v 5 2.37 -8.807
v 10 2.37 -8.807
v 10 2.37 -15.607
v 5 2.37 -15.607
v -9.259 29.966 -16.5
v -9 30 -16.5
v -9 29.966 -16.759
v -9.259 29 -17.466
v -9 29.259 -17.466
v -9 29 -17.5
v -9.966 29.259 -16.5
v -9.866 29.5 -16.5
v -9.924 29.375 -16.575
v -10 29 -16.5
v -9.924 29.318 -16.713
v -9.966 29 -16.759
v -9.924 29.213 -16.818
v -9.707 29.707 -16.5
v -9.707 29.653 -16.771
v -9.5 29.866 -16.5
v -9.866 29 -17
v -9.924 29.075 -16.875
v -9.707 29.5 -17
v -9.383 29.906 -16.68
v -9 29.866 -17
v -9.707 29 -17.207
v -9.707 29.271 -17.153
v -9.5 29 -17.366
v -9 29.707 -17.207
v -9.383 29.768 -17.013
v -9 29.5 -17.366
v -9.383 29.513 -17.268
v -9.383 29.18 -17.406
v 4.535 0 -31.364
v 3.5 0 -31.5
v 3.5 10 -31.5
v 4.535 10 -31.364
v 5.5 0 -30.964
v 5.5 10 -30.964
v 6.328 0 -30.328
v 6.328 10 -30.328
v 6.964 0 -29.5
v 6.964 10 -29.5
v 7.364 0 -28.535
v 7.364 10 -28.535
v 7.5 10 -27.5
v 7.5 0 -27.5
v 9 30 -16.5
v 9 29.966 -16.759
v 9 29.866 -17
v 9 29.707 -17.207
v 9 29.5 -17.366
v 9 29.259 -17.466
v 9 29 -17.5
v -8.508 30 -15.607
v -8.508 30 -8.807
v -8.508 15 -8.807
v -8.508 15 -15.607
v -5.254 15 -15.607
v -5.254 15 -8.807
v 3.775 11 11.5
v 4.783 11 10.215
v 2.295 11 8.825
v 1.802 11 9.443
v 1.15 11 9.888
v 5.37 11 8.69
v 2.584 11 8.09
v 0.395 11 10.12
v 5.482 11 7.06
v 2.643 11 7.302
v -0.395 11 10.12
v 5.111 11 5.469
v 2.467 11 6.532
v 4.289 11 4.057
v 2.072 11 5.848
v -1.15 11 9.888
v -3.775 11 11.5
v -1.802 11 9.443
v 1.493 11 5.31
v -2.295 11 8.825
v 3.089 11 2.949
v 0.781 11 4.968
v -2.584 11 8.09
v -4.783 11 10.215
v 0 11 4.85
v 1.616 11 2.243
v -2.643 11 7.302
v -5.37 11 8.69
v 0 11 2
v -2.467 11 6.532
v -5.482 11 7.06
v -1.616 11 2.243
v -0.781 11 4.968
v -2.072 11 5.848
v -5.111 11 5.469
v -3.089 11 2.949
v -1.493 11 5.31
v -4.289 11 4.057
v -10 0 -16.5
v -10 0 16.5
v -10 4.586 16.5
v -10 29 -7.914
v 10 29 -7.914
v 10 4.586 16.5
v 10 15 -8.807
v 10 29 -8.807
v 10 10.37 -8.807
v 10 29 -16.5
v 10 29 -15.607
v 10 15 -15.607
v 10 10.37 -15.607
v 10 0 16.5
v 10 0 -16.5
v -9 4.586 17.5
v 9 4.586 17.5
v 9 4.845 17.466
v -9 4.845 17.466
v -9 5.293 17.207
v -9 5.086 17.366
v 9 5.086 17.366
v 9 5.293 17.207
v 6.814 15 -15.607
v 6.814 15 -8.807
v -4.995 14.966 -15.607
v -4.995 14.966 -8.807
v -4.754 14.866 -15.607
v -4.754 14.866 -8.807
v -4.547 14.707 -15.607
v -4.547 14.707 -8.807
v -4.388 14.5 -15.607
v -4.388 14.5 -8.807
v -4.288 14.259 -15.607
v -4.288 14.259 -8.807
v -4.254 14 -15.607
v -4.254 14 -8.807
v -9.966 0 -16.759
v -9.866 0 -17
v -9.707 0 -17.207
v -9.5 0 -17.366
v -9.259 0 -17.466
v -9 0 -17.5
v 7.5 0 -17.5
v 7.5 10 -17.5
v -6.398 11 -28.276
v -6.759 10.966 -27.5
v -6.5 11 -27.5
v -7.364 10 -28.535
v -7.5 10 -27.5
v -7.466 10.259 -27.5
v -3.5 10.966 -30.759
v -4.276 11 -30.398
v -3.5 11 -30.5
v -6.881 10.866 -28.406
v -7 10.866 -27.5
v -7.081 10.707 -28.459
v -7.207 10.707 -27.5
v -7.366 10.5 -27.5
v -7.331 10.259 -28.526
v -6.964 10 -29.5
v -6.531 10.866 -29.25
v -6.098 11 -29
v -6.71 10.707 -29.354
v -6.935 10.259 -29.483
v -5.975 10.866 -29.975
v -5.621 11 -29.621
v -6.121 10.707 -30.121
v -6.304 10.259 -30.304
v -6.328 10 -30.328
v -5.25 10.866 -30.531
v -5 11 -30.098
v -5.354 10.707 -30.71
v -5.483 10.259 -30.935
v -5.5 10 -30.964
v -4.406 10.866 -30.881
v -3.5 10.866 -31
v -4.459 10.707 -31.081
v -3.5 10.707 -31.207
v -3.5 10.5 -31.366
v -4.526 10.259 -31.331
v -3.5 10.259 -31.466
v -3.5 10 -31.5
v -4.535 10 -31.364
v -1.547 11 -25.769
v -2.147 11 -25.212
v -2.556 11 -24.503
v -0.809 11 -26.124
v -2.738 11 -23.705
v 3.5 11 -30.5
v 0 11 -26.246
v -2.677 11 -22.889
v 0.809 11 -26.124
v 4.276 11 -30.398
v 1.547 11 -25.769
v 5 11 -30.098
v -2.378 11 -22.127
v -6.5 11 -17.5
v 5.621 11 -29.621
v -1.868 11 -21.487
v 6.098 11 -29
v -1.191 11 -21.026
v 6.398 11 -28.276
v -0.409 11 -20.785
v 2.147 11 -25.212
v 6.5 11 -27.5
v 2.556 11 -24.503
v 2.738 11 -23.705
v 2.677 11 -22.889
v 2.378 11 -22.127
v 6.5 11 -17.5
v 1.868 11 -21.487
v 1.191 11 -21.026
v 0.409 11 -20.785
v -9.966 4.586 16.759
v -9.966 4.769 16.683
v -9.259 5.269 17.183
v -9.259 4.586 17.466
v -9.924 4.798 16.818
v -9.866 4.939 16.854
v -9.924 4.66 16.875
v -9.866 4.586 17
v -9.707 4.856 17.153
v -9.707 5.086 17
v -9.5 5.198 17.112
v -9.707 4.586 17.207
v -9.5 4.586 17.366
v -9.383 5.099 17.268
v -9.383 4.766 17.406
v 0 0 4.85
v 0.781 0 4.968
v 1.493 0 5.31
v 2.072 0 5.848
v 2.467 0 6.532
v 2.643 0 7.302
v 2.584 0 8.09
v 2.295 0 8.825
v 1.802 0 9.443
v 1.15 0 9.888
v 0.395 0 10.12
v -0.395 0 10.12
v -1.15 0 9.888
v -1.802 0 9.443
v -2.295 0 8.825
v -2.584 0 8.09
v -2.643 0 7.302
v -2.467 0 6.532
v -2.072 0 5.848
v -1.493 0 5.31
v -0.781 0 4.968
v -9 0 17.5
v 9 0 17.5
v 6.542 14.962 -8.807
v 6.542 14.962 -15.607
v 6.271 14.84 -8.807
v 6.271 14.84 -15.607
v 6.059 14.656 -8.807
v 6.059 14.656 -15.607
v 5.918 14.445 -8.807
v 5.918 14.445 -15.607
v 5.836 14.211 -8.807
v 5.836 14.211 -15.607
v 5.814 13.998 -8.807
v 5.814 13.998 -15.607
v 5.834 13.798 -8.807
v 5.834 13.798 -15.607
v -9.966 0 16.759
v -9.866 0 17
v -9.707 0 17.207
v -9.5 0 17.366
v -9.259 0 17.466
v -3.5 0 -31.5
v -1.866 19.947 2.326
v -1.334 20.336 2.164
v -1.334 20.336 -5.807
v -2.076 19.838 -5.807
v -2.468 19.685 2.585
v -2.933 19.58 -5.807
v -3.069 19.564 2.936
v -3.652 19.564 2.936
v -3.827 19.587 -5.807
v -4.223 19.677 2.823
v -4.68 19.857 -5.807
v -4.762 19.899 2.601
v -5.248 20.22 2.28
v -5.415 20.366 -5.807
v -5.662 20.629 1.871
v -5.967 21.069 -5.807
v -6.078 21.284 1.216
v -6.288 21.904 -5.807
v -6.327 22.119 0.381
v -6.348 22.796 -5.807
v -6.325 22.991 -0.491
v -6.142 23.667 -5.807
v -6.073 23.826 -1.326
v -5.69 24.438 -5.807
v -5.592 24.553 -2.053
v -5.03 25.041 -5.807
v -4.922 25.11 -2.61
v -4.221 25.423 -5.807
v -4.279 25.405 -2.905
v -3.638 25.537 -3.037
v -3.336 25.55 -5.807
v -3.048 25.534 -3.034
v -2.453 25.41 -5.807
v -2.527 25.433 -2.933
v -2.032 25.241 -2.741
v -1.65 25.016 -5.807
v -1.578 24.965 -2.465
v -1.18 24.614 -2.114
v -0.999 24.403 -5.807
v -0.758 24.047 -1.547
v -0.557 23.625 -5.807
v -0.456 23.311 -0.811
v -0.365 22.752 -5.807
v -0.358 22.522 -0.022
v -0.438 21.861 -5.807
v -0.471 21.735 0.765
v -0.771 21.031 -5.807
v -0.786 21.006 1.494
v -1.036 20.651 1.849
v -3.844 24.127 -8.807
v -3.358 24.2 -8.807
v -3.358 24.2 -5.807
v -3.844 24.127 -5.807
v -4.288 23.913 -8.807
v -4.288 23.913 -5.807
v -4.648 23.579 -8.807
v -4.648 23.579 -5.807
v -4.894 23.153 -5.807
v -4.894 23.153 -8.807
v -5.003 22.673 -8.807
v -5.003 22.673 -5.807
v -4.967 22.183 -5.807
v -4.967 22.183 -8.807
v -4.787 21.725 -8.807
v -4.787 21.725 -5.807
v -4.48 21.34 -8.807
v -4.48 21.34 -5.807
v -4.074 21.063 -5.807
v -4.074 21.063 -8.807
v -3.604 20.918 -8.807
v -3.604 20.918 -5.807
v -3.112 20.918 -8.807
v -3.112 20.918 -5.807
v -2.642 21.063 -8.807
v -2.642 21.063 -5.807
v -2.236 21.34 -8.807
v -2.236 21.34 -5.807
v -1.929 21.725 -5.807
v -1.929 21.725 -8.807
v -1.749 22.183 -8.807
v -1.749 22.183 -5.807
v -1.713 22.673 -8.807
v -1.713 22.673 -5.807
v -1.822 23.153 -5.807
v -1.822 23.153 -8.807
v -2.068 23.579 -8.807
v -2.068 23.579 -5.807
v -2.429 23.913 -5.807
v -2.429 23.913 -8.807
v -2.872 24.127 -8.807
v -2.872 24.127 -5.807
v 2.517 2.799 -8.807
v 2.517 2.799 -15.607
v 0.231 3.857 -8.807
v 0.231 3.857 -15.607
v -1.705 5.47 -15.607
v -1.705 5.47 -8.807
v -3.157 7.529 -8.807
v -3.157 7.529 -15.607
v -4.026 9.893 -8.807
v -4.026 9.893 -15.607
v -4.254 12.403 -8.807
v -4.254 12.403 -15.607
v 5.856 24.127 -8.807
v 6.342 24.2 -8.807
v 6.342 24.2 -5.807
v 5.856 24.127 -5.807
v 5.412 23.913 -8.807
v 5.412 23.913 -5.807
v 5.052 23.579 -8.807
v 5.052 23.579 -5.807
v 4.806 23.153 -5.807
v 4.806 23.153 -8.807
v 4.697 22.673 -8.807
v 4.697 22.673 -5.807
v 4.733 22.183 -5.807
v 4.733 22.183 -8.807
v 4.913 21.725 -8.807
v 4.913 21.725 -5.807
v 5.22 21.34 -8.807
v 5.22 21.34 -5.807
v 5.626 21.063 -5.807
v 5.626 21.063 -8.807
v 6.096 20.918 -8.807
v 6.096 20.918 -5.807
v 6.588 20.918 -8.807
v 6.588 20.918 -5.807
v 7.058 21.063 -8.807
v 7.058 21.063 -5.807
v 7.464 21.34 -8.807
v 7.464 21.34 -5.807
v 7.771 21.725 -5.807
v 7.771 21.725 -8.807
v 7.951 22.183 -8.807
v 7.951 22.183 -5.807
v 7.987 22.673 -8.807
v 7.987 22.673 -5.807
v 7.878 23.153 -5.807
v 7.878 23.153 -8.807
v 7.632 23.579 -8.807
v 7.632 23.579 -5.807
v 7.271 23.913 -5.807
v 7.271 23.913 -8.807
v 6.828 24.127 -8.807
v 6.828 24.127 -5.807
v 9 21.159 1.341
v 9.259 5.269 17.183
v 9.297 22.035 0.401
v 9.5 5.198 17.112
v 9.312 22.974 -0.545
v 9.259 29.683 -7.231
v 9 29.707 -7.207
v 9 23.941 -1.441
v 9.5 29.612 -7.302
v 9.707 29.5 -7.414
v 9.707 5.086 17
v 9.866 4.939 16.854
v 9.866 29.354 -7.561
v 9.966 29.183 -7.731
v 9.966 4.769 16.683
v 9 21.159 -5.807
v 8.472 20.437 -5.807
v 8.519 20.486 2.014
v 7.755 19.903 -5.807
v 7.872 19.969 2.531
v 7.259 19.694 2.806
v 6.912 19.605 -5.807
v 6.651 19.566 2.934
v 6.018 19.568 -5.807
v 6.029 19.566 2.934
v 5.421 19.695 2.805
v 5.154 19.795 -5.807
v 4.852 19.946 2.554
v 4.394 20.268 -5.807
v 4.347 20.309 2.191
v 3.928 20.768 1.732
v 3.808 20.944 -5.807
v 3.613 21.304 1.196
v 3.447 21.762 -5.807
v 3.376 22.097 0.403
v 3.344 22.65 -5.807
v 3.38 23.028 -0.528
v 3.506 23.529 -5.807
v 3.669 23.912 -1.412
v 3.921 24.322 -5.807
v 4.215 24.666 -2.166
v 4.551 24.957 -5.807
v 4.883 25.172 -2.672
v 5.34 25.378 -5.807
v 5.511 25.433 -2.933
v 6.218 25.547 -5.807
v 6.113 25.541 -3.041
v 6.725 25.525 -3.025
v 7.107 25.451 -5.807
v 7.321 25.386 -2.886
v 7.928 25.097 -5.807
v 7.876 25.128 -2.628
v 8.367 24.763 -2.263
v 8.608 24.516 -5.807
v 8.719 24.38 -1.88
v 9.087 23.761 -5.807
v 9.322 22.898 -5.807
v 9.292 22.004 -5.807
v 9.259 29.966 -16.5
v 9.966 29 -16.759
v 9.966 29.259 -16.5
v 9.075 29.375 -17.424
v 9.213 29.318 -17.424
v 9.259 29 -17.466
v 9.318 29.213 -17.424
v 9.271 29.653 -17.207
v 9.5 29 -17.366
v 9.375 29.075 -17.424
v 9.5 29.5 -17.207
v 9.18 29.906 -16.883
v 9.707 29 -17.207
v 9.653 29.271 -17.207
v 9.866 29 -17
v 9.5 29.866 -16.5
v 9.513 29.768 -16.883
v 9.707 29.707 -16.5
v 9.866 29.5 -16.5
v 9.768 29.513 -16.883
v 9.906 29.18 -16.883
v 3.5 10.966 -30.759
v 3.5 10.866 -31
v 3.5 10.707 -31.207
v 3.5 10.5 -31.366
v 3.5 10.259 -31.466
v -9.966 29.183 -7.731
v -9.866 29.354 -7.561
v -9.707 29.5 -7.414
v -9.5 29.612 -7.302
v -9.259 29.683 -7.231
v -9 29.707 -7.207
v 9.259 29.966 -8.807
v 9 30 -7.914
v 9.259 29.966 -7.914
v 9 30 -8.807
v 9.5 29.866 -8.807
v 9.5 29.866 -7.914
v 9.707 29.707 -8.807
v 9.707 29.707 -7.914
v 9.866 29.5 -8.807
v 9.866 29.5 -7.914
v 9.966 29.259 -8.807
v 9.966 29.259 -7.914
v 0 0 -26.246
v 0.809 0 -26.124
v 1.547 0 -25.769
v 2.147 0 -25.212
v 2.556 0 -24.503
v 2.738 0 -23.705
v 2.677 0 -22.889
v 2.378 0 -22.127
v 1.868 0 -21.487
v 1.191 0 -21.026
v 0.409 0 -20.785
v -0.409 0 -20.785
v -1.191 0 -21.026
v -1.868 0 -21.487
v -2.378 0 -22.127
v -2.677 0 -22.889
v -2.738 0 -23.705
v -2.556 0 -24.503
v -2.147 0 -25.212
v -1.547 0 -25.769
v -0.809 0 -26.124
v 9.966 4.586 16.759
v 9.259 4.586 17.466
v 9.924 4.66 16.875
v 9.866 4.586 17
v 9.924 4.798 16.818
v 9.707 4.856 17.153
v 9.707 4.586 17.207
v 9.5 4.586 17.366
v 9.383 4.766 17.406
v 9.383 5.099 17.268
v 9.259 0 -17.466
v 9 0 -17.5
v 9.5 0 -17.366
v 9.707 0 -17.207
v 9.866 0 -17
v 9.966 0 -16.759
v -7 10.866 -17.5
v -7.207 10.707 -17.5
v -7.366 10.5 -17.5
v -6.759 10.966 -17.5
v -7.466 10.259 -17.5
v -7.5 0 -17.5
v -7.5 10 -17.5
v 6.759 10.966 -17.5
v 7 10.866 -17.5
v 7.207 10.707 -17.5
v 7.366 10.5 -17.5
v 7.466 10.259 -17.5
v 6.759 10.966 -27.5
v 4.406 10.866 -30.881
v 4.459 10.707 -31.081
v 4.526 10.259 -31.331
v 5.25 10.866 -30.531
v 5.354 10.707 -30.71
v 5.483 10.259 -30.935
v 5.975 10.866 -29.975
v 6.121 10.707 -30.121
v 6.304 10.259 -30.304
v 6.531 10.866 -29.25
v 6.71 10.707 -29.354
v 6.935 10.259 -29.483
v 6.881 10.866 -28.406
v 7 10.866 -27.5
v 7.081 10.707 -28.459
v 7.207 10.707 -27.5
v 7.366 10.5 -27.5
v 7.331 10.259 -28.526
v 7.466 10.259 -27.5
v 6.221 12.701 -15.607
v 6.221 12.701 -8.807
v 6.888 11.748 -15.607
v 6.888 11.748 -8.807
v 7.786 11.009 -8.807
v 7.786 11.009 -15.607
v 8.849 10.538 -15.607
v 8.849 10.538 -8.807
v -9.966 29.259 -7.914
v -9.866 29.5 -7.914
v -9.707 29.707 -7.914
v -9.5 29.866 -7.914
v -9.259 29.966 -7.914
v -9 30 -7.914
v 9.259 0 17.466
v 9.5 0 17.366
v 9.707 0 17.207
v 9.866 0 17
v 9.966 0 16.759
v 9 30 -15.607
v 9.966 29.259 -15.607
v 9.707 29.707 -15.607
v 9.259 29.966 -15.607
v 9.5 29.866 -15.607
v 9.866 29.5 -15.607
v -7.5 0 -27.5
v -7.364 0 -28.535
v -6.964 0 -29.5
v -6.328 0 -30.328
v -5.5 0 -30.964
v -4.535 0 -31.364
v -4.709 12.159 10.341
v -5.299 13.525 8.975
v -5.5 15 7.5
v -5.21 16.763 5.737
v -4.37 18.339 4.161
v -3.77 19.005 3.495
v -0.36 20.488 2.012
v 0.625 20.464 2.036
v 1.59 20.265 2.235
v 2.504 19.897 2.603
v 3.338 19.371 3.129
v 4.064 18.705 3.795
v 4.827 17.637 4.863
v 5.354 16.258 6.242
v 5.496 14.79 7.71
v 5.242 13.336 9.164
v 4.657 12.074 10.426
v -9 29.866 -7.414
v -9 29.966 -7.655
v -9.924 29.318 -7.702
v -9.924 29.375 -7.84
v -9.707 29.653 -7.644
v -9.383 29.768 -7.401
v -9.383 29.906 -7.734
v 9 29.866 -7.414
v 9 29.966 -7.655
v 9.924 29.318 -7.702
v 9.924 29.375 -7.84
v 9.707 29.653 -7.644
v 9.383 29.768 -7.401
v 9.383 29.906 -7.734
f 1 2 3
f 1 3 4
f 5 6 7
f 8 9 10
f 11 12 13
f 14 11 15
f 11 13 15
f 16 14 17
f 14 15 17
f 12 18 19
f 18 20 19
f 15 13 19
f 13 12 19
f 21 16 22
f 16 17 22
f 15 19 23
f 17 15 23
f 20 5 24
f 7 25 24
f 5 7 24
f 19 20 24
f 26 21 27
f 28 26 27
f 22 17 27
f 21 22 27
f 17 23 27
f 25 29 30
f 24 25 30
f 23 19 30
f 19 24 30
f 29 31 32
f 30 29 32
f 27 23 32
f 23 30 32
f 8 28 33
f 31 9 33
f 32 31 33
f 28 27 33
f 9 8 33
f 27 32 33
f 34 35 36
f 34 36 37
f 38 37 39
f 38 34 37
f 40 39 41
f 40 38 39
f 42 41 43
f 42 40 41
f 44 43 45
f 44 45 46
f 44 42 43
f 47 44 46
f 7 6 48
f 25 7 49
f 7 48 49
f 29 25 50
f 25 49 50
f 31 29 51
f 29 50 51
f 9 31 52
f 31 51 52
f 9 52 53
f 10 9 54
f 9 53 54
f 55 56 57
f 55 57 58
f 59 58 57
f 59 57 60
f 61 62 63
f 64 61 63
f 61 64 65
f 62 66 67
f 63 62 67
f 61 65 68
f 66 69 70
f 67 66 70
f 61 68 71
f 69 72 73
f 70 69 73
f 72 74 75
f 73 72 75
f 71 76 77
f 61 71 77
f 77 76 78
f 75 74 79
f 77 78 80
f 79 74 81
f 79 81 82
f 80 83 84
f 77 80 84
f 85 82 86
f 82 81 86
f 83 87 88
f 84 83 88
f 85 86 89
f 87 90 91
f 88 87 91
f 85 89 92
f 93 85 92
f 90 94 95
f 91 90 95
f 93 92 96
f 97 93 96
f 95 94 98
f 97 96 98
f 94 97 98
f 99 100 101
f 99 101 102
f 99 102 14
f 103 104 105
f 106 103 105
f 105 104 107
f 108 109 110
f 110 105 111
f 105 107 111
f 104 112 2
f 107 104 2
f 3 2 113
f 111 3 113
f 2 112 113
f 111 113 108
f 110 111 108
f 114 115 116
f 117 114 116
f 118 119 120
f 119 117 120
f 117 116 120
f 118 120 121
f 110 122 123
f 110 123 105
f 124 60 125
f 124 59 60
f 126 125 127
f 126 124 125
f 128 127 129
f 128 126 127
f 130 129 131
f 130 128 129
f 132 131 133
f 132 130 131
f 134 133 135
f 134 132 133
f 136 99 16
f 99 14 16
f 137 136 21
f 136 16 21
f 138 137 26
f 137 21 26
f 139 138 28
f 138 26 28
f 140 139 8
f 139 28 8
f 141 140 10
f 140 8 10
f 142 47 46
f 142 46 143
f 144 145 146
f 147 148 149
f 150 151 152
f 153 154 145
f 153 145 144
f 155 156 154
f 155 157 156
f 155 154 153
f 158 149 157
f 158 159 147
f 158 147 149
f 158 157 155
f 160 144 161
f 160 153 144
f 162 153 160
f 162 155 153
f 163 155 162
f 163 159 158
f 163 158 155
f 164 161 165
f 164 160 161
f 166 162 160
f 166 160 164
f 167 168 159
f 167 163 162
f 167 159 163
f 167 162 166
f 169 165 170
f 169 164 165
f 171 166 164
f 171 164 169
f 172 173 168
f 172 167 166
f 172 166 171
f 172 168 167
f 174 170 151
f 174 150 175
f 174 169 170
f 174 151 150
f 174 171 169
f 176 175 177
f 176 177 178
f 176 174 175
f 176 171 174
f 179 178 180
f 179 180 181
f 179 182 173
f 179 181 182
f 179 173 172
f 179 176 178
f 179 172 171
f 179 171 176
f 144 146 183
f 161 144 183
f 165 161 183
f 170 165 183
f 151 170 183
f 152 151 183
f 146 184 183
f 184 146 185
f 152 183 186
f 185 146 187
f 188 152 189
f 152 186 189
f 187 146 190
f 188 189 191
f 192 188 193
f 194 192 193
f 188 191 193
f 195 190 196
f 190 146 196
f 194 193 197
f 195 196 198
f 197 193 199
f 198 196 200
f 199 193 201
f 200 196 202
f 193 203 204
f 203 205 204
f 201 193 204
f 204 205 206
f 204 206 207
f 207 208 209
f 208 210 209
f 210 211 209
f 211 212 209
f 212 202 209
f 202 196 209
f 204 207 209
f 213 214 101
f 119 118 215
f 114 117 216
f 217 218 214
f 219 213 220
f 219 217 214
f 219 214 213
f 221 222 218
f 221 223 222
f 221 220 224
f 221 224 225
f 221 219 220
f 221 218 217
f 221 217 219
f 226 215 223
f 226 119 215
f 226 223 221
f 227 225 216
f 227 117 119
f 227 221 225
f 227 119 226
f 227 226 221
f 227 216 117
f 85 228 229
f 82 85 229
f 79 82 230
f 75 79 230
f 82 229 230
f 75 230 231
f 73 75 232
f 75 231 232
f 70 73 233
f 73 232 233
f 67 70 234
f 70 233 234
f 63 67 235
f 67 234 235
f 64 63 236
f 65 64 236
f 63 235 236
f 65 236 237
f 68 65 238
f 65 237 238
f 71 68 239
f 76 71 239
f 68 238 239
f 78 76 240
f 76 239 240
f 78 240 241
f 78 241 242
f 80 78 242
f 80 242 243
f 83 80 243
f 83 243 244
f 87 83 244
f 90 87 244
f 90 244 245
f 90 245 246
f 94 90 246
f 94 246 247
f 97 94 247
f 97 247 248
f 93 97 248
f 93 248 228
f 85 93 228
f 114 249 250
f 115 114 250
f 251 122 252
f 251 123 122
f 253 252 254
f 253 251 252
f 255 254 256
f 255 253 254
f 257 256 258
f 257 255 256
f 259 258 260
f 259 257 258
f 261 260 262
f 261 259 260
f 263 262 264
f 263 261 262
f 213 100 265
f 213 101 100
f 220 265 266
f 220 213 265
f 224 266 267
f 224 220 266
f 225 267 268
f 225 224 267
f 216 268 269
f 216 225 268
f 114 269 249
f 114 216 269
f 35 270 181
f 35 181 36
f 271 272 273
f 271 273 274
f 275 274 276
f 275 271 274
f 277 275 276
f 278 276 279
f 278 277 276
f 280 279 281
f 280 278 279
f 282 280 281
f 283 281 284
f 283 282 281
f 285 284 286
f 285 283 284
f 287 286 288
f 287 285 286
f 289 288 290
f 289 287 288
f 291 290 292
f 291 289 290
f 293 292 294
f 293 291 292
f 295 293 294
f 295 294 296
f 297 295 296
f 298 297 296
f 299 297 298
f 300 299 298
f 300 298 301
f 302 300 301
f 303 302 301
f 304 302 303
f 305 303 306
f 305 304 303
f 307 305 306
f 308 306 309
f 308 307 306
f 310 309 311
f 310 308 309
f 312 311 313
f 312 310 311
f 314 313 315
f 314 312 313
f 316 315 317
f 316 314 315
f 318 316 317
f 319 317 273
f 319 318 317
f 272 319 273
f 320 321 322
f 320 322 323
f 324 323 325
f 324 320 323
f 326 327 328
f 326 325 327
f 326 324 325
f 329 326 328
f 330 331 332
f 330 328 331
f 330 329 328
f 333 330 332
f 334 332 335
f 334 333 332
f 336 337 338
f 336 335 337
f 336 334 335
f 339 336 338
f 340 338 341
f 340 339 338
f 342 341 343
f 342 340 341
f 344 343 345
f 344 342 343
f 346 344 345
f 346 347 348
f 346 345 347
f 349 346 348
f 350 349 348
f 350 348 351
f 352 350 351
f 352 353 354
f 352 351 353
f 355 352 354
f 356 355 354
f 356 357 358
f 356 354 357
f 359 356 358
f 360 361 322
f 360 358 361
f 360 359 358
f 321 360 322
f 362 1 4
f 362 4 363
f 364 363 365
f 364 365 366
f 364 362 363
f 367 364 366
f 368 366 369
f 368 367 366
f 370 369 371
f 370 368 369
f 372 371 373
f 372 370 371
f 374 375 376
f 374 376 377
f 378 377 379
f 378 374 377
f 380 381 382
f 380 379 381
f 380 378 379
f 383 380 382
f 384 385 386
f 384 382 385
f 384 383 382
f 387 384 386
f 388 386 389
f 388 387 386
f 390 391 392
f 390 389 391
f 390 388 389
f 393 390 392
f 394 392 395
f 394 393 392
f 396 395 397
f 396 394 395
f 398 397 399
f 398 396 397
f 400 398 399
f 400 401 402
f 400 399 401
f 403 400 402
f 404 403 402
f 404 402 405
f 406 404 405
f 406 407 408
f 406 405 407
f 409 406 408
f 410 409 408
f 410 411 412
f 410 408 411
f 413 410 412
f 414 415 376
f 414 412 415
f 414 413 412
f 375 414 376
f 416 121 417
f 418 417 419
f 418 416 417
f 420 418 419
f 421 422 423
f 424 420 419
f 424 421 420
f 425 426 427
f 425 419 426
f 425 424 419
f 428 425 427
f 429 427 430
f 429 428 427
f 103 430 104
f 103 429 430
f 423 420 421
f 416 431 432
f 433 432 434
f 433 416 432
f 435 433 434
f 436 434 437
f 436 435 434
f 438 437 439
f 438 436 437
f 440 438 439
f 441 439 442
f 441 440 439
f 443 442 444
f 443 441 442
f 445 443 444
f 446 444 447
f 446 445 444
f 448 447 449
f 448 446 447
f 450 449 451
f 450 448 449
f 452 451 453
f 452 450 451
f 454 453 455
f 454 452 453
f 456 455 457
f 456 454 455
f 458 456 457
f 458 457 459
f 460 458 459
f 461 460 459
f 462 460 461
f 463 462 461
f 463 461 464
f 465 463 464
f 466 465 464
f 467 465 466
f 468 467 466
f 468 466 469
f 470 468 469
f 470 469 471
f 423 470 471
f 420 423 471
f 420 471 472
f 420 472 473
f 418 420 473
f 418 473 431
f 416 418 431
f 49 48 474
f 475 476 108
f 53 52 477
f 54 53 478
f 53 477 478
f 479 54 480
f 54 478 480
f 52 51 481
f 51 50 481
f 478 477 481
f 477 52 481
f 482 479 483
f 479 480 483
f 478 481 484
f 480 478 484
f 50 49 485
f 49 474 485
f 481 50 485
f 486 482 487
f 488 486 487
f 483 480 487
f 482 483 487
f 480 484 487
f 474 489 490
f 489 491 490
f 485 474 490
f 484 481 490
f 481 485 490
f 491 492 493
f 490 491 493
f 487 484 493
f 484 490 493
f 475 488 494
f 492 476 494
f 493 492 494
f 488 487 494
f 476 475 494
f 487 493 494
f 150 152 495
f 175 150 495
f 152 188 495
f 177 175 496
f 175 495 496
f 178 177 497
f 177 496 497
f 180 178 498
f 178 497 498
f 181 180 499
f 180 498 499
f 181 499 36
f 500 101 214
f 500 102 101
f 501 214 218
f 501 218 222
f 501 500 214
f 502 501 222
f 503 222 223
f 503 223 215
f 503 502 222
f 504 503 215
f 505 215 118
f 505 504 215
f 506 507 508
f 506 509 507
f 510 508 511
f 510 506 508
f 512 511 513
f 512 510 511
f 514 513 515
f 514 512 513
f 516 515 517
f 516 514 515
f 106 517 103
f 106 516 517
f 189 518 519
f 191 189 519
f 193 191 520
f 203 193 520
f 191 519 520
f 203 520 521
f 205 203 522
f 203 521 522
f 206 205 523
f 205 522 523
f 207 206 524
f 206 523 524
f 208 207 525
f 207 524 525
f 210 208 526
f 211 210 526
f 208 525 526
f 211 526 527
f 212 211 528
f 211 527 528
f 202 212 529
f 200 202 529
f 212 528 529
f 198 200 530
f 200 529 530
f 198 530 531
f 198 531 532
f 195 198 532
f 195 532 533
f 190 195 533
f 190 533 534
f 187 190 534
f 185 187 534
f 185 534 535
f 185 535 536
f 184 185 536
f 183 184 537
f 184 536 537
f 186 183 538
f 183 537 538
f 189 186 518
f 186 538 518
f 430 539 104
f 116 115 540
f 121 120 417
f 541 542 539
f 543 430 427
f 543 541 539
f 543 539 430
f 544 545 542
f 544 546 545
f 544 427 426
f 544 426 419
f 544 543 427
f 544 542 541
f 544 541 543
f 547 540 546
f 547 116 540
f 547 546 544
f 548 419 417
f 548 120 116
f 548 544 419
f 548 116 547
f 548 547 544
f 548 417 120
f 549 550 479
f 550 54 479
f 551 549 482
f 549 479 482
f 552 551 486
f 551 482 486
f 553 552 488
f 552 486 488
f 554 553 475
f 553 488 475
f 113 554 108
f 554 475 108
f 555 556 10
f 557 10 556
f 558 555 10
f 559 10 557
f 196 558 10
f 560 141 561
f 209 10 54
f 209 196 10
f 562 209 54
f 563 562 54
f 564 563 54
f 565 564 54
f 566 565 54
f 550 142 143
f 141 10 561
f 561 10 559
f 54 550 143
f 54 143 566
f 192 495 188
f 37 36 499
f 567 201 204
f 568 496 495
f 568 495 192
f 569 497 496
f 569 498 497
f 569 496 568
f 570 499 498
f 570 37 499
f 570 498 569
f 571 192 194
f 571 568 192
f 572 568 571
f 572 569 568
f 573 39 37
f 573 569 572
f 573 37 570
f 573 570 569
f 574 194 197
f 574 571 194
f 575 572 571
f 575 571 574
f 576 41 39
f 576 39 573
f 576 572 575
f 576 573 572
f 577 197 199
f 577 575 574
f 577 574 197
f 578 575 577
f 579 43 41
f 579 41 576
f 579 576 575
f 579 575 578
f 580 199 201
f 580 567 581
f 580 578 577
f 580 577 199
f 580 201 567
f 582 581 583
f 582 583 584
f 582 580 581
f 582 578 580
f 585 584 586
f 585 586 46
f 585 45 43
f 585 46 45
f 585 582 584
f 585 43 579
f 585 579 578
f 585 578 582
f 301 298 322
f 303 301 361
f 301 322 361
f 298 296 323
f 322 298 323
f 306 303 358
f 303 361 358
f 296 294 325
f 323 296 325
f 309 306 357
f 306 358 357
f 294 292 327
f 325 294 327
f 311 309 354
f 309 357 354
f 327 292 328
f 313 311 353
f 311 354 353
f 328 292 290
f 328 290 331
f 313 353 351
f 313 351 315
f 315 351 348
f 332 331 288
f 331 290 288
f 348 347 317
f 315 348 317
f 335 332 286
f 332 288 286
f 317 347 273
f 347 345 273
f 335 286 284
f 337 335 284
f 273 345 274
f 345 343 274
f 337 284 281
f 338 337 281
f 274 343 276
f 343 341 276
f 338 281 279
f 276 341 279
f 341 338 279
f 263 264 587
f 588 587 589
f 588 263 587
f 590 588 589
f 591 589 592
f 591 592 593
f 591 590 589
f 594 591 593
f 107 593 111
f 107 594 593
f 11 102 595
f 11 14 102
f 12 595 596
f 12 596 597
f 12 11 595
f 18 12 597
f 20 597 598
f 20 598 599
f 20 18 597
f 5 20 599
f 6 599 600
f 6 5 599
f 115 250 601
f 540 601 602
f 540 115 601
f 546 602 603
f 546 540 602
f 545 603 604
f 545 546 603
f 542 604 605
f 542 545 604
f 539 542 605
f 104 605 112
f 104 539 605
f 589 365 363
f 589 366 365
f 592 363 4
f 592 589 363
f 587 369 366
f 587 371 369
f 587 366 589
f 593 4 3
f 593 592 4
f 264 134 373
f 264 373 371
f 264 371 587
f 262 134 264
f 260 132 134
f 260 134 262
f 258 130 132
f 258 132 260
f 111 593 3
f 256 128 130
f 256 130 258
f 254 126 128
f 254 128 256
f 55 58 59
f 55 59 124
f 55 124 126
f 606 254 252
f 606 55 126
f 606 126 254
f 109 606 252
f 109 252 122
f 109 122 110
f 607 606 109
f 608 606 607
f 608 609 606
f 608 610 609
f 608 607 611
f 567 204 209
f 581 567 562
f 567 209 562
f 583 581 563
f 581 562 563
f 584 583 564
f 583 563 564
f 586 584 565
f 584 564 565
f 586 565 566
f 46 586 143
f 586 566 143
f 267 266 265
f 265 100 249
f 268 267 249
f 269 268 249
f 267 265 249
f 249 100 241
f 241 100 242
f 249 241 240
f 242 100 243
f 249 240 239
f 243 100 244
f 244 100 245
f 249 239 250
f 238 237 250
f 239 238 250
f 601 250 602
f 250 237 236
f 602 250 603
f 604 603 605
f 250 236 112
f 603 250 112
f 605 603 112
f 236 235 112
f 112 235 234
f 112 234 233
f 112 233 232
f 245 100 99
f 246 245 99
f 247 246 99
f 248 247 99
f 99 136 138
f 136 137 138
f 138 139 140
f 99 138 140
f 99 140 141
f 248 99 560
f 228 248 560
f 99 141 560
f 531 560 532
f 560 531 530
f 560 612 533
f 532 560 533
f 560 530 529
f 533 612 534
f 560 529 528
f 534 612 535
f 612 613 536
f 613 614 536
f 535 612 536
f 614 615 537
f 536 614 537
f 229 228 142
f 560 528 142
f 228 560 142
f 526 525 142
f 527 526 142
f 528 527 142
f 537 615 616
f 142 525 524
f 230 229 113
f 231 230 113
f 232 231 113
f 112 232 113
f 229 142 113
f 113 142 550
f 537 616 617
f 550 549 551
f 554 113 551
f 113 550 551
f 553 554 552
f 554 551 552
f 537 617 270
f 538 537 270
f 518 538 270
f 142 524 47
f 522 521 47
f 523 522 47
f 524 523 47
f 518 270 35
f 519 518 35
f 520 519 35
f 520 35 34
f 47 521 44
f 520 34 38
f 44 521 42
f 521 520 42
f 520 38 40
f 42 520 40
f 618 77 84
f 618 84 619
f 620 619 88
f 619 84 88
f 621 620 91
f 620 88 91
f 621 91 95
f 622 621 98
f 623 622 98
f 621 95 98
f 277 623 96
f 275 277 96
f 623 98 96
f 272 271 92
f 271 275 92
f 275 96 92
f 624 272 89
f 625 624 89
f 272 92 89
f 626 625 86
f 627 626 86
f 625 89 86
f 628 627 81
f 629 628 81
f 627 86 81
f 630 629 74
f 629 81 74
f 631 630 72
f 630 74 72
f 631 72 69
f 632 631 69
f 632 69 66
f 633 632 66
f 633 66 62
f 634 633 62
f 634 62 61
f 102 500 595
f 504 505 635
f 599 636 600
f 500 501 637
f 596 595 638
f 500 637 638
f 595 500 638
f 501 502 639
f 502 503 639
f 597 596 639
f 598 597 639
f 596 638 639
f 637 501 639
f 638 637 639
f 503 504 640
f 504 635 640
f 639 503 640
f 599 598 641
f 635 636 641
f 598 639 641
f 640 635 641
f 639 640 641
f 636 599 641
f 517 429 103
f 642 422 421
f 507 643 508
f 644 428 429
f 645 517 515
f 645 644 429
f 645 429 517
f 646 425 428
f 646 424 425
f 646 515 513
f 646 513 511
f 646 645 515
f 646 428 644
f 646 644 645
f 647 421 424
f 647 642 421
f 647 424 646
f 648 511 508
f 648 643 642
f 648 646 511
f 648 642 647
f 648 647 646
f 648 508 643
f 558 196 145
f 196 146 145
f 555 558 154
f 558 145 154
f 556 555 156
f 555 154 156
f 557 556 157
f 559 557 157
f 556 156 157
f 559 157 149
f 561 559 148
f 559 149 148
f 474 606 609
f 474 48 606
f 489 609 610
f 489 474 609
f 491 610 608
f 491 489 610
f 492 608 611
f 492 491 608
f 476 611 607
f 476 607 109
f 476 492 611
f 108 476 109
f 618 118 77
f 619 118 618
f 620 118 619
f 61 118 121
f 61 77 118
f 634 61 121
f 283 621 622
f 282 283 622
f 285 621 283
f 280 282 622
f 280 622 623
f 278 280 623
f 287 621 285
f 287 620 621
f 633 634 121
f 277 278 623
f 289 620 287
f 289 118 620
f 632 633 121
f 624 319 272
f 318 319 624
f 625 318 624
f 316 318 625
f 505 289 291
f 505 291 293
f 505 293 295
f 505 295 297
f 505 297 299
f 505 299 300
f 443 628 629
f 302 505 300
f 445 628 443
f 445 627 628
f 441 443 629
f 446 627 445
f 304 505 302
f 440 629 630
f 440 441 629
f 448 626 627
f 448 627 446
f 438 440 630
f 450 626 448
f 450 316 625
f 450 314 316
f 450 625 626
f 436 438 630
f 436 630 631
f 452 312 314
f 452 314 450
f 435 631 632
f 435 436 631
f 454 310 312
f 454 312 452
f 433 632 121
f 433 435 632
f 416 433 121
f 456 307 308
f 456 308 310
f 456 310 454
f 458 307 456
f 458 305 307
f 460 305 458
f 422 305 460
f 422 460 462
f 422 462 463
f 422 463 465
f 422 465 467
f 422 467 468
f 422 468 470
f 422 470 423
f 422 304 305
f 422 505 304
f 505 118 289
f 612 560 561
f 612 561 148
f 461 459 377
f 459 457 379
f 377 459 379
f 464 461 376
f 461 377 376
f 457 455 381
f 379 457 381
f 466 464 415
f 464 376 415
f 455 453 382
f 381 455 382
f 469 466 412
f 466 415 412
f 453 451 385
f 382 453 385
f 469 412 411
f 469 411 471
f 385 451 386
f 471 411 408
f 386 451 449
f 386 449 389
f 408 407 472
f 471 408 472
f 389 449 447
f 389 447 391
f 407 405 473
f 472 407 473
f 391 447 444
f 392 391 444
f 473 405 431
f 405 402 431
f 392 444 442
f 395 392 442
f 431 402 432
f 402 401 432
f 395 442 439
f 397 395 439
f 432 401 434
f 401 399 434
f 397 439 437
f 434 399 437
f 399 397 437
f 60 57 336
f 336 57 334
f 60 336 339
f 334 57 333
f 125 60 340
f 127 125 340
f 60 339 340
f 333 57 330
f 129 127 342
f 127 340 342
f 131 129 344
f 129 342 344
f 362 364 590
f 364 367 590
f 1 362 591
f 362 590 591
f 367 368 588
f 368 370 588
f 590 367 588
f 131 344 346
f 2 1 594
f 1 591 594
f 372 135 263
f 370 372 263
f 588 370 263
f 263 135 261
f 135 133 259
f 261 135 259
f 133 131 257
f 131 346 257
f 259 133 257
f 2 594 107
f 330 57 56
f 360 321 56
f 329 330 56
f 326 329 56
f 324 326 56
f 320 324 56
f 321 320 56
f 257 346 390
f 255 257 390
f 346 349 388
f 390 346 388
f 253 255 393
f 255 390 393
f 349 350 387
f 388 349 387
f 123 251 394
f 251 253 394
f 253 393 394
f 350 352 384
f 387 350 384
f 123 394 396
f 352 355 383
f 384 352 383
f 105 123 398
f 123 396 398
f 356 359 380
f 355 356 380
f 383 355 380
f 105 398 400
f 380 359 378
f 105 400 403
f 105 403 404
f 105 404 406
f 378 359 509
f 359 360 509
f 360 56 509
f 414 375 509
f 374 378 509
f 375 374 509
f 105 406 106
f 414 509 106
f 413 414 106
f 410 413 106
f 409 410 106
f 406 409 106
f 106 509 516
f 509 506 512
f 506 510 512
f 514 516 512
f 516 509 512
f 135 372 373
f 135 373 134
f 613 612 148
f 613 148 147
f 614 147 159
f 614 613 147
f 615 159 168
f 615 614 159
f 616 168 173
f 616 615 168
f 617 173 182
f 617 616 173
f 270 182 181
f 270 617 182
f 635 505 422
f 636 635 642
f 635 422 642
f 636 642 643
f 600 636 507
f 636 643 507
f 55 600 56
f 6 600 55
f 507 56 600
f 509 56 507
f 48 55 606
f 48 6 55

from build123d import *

# Parameters (mm, degrees)
SKETCH1_W               = 20
SKETCH1_H               = 35
BOSS_EXTRUDE1_DEPTH     = 30
CHAMFER1_SIZE           = 25
FILLET1_R               = 1
SKETCH2_R               = 2.65
CUT_EXTRUDE2_DEPTH      = 20
SKETCH4_R               = 5.5
CUT_EXTRUDE3_DEPTH      = 20
SKETCH5_W               = 20.05
SKETCH5_H               = 6.8
CUT_EXTRUDE4_DEPTH      = 15
CUT_EXTRUDE5_DEPTH      = 6.8
FILLET3_R               = 1
SKETCH7_R               = 2.745697614
BOSS_EXTRUDE2_DEPTH     = 11
FILLET4_R               = 1
SKETCH10_R              = 1.65
CUT_EXTRUDE7_DEPTH      = 18
CUT_EXTRUDE8_DEPTH      = 8
CUT_EXTRUDE8_DEPTH_BACK = 8
SKETCH11_R              = 3


with BuildPart() as part:
    # Sketch1 → Boss-Extrude1 (new body)
    with BuildSketch(Plane(origin=(0, 0, 0), x_dir=(1, 0, 0), z_dir=(0, 1, 0))):
        Rectangle(SKETCH1_W, SKETCH1_H)
    extrude(amount=BOSS_EXTRUDE1_DEPTH)

    # Chamfer1
    chamfer1_edges = [part.edges().sort_by_distance(p)[0] for p in [
        (0, 30, 17.5),
    ]]
    chamfer(chamfer1_edges, length=CHAMFER1_SIZE)

    # Fillet1
    fillet1_edges = [part.edges().sort_by_distance(p)[0] for p in [
        (10, 30, -12.5),
        (0, 30, -7.5),
        (10, 2.5, 17.5),
        (10, 17.5, 5),
        (-10, 2.5, 17.5),
        (0, 5, 17.5),
        (0, 30, -17.5),
        (-10, 17.5, 5),
        (-10, 30, -12.5),
        (-10, 15, -17.5),
        (10, 15, -17.5),
    ]]
    fillet(fillet1_edges, radius=FILLET1_R)

    # Sketch2 → Cut-Extrude2 (cut)
    with BuildSketch(Plane(origin=(0, 0, 0), x_dir=(-1, 0, 0), z_dir=(0, -1, 0))):
        with Locations(Location((0, -7.5, 0), (0, 0, 90))):
            Circle(SKETCH2_R)
    extrude(amount=-CUT_EXTRUDE2_DEPTH, mode=Mode.SUBTRACT)

    # Sketch4 → Cut-Extrude3 (cut)
    with BuildSketch(Plane(origin=(0, 11, 0), x_dir=(-1, 0, 0), z_dir=(0, -1, 0))):
        with Locations((0, -7.5)):
            Circle(SKETCH4_R)
    extrude(amount=-CUT_EXTRUDE3_DEPTH, mode=Mode.SUBTRACT)

    # Sketch5 → Cut-Extrude4 (cut)
    with BuildSketch(Plane(origin=(0, 30, 0), x_dir=(1, 0, 0), z_dir=(0, 1, 0))):
        with Locations((1.516964354, 12.207106781)):
            Rectangle(SKETCH5_W, SKETCH5_H)
    extrude(amount=-CUT_EXTRUDE4_DEPTH, mode=Mode.SUBTRACT)

    # Sketch6 → Cut-Extrude5 (cut)
    with BuildSketch(Plane(origin=(0, 0, -8.807106781), x_dir=(-1, 0, 0), z_dir=(0, 0, -1))):
        with BuildLine():
            Line((-10, 10.37003714), (-10, 2.37003714))
            Line((-10, 2.37003714), (-5, 2.37003714))
            ThreePointArc((-5, 2.37003714), (1.70481367, 5.469731724), (4.254017823, 12.402565997))
            Line((4.254017823, 12.402565997), (4.254017823, 21.00909074))
            Line((4.254017823, 21.00909074), (-5.745982177, 21.00909074))
            Line((-5.745982177, 21.00909074), (-5.745982177, 14.664154296))
            ThreePointArc((-5.745982177, 14.664154296), (-6.989544506, 11.641898939), (-10, 10.37003714))
        make_face()
    extrude(amount=CUT_EXTRUDE5_DEPTH, mode=Mode.SUBTRACT)

    # Fillet3
    fillet3_edges = [part.edges().sort_by_distance(p)[0] for p in [
        (5.745982177, 15, -12.207106781),
        (-4.254017823, 15, -12.207106781),
    ]]
    fillet(fillet3_edges, radius=FILLET3_R)

    # Sketch7 → Boss-Extrude2 (add)
    with BuildSketch(Plane.XZ):
        with BuildLine():
            Line((7.5, -17.5), (-7.5, -17.5))
            Line((-7.5, -17.5), (-7.5, -27.5))
            ThreePointArc((-7.5, -27.5), (-6.328427125, -30.328427125), (-3.5, -31.5))
            Line((-3.5, -31.5), (3.5, -31.5))
            ThreePointArc((3.5, -31.5), (6.328427125, -30.328427125), (7.5, -27.5))
            Line((7.5, -27.5), (7.5, -17.5))
        make_face()
        with Locations(Location((0, -23.5, 0), (0, 0, 270))):
            Circle(SKETCH7_R, mode=Mode.SUBTRACT)
    extrude(amount=-BOSS_EXTRUDE2_DEPTH)

    # Fillet4
    fillet4_edges = [part.edges().sort_by_distance(p)[0] for p in [
        (6.328427125, 11, -30.328427125),
        (0, 11, -31.5),
        (-6.328427125, 11, -30.328427125),
        (-7.5, 11, -22.5),
        (7.5, 11, -22.5),
    ]]
    fillet(fillet4_edges, radius=FILLET4_R)

    # Sketch10 → Cut-Extrude7 (cut)
    with BuildSketch(Plane.XY.offset(-15.607106781)):
        with Locations(Location((-3.358035646, 22.55, 0), (0, 0, 90))):
            Circle(SKETCH10_R)
        with Locations(Location((6.341964354, 22.55, 0), (0, 0, 90))):
            Circle(SKETCH10_R)
    extrude(amount=CUT_EXTRUDE7_DEPTH, mode=Mode.SUBTRACT)

    # Sketch11 → Cut-Extrude8 (cut, two sides: drawn at the far end of the back side and taken through both)
    with BuildSketch(Plane(origin=(0, 0, 2.192893219), x_dir=(-1, 0, 0), z_dir=(0, 0, -1)).offset(-CUT_EXTRUDE8_DEPTH_BACK)):
        with Locations(Location((3.358035646, 22.55, 0), (0, 0, 227.566705352))):
            Circle(SKETCH11_R)
        with Locations(Location((-6.341964354, 22.55, 0), (0, 0, 207.623697814))):
            Circle(SKETCH11_R)
    extrude(amount=CUT_EXTRUDE8_DEPTH + CUT_EXTRUDE8_DEPTH_BACK, mode=Mode.SUBTRACT)


solid = part.part
